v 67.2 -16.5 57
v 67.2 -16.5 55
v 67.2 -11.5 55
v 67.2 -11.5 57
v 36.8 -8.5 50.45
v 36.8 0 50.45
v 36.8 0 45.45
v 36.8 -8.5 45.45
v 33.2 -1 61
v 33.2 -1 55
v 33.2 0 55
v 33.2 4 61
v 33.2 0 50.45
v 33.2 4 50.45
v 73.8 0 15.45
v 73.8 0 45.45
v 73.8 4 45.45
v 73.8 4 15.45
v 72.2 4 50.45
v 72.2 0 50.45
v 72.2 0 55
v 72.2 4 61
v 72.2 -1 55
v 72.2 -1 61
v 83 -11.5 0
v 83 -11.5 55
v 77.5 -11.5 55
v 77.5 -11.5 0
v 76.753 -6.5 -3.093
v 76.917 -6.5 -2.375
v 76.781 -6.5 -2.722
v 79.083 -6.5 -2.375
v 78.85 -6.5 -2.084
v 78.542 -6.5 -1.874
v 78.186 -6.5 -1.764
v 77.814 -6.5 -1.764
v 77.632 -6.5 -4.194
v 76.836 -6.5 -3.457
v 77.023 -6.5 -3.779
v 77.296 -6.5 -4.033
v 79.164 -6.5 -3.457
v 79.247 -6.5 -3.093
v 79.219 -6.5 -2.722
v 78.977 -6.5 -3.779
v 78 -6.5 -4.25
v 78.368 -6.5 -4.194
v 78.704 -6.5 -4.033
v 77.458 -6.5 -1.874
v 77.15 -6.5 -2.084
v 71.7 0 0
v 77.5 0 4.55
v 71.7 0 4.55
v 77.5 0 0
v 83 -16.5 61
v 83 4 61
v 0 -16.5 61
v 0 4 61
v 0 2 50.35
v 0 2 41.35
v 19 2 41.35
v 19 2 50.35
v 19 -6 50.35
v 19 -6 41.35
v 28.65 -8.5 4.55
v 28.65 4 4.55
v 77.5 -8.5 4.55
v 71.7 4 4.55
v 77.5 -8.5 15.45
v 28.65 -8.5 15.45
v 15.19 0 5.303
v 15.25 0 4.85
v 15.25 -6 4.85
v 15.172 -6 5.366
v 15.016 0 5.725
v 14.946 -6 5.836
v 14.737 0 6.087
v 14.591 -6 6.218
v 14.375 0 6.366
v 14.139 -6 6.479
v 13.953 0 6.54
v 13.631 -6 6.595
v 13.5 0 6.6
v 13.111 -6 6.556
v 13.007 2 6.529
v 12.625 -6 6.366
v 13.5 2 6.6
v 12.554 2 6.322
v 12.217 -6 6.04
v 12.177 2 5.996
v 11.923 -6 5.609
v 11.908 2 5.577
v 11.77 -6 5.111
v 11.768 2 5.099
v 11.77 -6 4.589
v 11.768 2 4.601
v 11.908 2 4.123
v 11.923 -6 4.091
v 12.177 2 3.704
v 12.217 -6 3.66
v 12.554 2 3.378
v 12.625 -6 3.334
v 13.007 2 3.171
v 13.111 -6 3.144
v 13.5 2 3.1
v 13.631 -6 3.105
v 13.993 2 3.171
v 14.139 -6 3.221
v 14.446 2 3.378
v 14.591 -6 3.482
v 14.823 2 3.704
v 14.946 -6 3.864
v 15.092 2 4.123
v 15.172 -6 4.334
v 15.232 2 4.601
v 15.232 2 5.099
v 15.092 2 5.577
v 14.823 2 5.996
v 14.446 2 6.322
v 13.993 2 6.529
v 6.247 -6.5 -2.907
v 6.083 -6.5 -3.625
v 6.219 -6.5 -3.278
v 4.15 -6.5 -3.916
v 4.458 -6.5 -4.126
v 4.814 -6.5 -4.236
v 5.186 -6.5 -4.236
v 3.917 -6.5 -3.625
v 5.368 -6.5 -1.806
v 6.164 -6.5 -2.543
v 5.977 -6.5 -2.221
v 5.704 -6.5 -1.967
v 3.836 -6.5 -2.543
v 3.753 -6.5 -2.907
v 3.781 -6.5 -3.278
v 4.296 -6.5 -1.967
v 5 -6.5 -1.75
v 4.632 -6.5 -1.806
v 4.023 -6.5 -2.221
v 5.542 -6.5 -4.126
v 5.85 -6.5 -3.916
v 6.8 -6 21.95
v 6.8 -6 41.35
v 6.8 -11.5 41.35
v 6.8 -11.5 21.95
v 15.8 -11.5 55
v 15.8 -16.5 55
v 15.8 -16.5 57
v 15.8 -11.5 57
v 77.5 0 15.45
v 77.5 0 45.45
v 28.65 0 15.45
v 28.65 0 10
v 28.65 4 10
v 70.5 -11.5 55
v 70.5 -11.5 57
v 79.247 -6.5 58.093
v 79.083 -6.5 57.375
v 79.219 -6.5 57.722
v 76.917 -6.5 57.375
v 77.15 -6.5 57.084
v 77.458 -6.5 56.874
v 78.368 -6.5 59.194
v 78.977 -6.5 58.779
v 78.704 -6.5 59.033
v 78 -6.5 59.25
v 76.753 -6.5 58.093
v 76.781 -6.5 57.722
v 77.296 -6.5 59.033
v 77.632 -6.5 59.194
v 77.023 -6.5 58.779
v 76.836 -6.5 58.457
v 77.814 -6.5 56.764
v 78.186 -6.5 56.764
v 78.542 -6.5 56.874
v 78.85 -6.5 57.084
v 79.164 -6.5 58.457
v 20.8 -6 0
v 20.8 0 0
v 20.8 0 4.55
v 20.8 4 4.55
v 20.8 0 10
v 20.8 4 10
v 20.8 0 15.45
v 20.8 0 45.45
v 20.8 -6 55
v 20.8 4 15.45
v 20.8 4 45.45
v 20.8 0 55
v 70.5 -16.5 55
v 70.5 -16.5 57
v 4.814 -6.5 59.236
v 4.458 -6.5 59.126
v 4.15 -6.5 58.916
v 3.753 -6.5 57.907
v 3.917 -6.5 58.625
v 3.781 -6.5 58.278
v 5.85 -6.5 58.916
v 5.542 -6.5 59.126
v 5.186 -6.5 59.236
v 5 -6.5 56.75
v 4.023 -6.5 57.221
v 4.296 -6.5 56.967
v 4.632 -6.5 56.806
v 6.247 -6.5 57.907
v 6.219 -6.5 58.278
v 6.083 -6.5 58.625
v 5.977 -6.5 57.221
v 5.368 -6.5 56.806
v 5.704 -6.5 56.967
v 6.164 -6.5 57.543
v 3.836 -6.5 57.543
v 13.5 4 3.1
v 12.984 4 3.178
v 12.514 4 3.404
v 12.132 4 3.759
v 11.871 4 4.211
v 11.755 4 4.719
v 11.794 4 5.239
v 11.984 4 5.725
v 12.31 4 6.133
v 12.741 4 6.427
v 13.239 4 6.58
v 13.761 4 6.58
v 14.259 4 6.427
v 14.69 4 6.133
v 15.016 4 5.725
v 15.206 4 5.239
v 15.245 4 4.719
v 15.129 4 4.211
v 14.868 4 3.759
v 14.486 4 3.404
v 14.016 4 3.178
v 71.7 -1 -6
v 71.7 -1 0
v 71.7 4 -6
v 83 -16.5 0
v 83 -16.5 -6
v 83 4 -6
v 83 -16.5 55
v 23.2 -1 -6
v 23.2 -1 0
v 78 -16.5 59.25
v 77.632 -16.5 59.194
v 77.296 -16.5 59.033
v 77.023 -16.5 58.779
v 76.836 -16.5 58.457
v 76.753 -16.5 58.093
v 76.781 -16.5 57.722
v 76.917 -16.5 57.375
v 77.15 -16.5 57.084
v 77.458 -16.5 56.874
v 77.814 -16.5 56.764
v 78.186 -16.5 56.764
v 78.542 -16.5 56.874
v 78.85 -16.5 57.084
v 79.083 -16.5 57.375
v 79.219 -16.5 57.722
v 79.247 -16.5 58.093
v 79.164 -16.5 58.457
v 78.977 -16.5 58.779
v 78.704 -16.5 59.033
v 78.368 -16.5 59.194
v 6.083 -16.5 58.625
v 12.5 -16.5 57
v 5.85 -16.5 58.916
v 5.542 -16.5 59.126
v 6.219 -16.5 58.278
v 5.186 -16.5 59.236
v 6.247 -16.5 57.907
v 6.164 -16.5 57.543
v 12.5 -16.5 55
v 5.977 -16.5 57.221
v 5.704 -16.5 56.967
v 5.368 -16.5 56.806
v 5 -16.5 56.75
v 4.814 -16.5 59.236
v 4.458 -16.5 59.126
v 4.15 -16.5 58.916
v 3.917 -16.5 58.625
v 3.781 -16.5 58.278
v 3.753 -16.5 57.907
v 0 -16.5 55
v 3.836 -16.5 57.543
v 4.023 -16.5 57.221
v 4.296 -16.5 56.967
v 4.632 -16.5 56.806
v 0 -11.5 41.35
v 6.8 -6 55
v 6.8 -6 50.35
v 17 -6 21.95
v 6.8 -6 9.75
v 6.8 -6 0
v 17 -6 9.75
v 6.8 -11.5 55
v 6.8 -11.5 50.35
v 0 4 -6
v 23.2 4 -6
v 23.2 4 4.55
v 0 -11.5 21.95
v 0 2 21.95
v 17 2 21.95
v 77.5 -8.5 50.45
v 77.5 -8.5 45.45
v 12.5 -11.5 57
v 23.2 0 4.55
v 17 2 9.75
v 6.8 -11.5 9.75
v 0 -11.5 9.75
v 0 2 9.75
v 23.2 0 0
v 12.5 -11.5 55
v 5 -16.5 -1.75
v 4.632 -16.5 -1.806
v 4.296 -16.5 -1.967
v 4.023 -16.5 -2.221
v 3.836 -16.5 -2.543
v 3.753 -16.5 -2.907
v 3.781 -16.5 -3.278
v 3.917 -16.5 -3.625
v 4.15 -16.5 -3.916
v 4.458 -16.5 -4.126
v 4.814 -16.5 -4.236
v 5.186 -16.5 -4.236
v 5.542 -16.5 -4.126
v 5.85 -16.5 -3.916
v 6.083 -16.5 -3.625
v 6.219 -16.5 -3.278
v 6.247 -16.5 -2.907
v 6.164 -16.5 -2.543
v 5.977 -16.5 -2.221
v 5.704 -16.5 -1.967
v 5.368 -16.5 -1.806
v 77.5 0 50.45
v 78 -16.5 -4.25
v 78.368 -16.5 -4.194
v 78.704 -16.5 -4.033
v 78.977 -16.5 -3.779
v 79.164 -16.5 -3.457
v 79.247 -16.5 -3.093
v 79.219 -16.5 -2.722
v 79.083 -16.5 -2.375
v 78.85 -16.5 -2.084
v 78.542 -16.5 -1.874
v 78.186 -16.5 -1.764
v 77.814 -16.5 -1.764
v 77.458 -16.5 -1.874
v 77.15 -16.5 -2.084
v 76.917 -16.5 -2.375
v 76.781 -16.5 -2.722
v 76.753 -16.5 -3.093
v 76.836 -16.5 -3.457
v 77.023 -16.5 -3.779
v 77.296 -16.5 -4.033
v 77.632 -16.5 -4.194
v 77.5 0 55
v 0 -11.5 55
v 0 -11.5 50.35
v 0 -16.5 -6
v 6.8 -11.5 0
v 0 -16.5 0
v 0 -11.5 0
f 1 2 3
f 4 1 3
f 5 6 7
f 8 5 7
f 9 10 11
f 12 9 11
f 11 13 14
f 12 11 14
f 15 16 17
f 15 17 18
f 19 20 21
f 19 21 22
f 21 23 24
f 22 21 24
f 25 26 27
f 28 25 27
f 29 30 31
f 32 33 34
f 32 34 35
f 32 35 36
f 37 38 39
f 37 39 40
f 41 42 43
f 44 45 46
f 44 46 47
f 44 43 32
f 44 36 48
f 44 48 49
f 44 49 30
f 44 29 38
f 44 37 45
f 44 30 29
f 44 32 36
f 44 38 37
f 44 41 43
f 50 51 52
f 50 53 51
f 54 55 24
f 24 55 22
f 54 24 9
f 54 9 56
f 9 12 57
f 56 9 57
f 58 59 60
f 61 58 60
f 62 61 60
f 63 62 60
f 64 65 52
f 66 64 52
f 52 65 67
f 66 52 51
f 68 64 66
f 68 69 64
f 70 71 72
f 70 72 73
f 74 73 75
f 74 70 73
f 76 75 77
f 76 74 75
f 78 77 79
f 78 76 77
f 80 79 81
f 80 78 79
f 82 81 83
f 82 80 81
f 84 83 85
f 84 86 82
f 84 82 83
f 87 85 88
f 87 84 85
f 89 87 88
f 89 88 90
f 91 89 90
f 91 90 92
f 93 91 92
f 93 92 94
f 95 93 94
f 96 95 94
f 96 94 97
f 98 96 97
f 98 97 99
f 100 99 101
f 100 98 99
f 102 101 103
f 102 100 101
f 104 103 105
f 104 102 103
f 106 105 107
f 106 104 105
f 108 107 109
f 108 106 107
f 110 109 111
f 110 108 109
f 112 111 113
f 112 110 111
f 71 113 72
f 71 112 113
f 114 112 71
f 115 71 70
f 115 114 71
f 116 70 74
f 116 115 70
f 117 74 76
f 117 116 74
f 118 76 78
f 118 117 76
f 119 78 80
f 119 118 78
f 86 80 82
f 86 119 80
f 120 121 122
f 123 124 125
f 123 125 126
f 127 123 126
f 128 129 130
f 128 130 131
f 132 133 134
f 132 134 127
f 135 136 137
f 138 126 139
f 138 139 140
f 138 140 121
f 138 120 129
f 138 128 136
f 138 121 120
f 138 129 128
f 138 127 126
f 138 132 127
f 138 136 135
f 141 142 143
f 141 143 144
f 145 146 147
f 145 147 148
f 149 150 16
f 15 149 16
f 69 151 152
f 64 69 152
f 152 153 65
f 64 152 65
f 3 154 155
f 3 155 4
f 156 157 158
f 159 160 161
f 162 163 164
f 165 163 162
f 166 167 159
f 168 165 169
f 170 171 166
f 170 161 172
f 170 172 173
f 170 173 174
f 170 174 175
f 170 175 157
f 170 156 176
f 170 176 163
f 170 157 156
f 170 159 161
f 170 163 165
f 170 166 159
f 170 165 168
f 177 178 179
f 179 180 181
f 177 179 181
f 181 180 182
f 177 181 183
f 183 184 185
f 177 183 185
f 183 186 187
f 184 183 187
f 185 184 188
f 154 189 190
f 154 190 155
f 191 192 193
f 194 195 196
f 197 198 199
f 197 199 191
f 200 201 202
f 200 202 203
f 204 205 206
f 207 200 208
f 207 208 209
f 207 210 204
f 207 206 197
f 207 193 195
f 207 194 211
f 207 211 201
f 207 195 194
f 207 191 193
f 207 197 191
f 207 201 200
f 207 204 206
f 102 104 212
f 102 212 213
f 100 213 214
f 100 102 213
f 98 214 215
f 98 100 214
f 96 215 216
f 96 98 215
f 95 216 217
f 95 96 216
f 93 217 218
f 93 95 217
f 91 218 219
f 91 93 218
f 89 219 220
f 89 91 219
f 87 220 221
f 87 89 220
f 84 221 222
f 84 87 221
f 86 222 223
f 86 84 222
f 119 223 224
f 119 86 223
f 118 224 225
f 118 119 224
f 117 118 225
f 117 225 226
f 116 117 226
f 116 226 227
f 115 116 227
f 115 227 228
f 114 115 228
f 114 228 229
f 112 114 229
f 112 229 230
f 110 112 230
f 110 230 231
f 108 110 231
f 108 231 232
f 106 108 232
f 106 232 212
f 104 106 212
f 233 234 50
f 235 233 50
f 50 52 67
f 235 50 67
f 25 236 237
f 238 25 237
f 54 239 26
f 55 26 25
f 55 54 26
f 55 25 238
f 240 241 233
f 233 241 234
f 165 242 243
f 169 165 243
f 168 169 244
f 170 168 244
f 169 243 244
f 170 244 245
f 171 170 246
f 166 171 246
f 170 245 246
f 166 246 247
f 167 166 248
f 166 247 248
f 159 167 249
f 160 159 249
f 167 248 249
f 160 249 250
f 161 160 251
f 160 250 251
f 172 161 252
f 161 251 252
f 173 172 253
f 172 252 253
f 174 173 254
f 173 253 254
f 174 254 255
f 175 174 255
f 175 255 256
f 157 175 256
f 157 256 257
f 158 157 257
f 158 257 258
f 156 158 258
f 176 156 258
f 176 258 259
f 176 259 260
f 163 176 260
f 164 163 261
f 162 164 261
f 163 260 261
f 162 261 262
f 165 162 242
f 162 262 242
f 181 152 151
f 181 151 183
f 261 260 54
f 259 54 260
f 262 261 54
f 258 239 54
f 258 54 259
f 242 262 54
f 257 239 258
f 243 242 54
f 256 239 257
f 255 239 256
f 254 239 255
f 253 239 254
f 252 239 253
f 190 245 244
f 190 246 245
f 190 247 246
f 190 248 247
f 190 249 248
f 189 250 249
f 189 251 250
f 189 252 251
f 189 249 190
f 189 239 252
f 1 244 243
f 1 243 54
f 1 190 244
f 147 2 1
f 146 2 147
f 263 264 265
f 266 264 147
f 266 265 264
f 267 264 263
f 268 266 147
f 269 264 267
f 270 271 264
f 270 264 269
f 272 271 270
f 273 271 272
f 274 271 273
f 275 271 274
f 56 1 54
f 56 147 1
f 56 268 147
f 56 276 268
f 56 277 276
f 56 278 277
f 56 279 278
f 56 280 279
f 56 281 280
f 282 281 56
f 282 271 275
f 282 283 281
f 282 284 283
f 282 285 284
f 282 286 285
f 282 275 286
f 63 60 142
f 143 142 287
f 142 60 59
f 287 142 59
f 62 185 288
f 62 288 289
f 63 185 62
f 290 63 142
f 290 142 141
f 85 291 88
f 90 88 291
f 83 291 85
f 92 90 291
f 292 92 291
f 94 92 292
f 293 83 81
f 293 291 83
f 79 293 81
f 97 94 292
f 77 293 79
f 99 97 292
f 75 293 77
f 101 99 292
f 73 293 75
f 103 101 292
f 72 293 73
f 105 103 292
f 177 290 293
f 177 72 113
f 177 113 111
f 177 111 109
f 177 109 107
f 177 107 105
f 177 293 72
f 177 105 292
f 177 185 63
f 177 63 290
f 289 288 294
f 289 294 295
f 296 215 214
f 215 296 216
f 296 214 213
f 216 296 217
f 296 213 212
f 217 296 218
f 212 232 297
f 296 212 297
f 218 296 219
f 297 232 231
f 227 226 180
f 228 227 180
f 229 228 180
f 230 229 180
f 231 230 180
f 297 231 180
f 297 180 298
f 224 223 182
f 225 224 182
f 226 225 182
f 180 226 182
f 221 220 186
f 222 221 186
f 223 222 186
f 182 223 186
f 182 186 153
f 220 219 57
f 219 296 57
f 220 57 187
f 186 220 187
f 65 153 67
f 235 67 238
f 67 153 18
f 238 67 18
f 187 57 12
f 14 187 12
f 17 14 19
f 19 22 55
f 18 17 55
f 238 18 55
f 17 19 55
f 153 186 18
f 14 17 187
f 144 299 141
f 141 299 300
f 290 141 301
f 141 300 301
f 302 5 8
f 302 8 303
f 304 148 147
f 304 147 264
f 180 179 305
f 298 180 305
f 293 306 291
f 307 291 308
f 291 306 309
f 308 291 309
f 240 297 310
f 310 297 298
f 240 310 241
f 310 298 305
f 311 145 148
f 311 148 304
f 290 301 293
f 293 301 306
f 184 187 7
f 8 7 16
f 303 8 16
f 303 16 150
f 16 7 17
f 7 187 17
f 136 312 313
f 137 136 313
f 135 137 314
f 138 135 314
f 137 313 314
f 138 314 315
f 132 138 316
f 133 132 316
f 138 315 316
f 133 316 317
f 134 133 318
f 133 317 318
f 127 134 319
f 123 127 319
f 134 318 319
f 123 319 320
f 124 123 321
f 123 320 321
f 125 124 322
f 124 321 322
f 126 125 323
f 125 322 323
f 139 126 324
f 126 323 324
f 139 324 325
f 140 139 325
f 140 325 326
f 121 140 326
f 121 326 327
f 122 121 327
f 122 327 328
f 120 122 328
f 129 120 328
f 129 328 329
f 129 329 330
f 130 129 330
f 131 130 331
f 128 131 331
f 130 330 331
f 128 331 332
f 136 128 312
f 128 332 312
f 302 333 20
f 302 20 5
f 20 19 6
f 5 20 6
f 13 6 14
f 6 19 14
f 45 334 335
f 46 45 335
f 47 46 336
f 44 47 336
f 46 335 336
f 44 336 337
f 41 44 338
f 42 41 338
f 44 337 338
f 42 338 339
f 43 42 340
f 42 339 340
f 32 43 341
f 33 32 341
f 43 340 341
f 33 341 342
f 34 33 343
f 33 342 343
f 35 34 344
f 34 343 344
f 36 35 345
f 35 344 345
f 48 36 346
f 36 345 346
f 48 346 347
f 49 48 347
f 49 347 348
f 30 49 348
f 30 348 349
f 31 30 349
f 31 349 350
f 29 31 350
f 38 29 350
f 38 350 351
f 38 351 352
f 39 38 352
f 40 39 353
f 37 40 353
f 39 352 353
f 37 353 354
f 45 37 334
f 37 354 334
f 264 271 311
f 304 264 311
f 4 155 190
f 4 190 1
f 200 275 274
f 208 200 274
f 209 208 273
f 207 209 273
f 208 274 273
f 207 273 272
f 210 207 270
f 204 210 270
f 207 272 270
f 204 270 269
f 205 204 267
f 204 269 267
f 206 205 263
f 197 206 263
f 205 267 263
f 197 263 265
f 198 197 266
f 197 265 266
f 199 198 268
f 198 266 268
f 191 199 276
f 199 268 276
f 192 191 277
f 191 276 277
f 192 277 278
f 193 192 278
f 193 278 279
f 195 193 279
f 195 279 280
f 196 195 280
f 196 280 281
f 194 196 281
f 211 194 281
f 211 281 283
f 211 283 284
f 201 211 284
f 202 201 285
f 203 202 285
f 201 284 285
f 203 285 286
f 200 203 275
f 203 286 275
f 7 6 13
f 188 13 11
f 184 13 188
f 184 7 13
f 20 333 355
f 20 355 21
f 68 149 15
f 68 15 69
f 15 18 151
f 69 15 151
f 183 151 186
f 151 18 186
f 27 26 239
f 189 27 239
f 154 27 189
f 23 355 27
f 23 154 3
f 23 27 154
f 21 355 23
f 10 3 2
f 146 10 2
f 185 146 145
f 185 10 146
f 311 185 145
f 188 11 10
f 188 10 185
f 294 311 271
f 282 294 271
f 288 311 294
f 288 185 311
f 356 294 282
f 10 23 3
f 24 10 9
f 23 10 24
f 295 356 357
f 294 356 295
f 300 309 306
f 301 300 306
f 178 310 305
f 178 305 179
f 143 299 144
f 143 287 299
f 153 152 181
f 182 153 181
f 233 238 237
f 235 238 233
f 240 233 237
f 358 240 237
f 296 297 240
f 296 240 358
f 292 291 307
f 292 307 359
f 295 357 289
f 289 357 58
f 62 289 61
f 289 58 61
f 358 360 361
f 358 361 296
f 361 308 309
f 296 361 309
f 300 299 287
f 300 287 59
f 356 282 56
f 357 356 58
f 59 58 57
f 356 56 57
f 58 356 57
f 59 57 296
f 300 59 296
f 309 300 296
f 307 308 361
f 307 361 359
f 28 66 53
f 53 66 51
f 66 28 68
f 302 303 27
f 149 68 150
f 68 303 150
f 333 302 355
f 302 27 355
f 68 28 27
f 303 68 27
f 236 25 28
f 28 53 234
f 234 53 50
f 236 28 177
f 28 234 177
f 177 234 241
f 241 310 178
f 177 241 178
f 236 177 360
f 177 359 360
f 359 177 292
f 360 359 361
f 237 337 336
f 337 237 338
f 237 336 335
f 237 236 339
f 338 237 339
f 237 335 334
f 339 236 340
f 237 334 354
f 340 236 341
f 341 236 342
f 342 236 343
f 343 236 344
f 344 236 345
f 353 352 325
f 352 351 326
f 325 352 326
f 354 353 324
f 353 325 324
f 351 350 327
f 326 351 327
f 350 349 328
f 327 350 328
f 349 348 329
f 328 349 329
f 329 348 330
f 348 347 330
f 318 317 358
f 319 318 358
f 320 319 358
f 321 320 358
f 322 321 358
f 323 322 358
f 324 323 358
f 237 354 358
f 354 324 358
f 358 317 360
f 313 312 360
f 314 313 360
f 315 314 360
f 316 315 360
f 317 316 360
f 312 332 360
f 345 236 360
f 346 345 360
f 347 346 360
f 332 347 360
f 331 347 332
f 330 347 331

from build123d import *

# Parameters (mm, degrees)
SKETCH1_R               = 1.75
SKETCH1_W               = 53
SKETCH1_H               = 30
BOSS_EXTRUDE1_DEPTH     = 2
BOSS_EXTRUDE2_OUTLINE_R = 1.75
BOSS_EXTRUDE2_DEPTH     = 11.5
SKETCH3_R               = 1.75
SKETCH3_W               = 53
SKETCH3_H               = 30
BOSS_EXTRUDE3_DEPTH     = 2
BOSS_EXTRUDE4_DEPTH     = 6
BOSS_EXTRUDE5_DEPTH     = 6
SKETCH7_W               = 3.3
SKETCH7_H               = 5
CUT_EXTRUDE3_DEPTH      = 2
SKETCH9_W               = 55
SKETCH9_H               = 5.5
CUT_EXTRUDE5_DEPTH      = 14
SKETCH10_W              = 5.5
SKETCH10_H              = 11.5
BOSS_EXTRUDE6_DEPTH     = 55
BOSS_EXTRUDE8_DEPTH     = 8.5
SKETCH14_R              = 1.25
CUT_EXTRUDE6_DEPTH      = 10


# Read off the part's stored shape, not the designer's step: Boss-Extrude2
with BuildPart() as part:
    # Sketch1 → Boss-Extrude1 (new body)
    with BuildSketch(Plane(origin=(0, 0, 0), x_dir=(1, 0, 0), z_dir=(0, 1, 0))):
        Polygon((0, 0), (23.2, 0), (23.2, -4.55), (20.8, -4.55), (20.8, -10), (28.65, -10), (28.65, -4.55), (71.7, -4.55), (71.7, 0), (83, 0), (83, -22.35), (83, -30.15), (83, -55), (72.2, -55), (72.2, -50.45), (33.2, -50.45), (33.2, -55), (0, -55), (0, -50.35), (19, -50.35), (19, -41.35), (0, -41.35), (0, -21.95), (17, -21.95), (17, -9.75), (0, -9.75), align=None)
        with Locations(Location((13.5, -4.85, 0), (0, 0, 270))):
            Circle(SKETCH1_R, mode=Mode.SUBTRACT)
        with Locations((47.3, -30.45)):
            Rectangle(SKETCH1_W, SKETCH1_H, mode=Mode.SUBTRACT)
    extrude(amount=BOSS_EXTRUDE1_DEPTH)

    # Boss-Extrude2 outline → Boss-Extrude2 (add)
    with BuildSketch(Plane.XZ):
        Polygon((0, 9.75), (0, 0), (20.8, 0), (20.8, 55), (0, 55), (0, 50.35), (19, 50.35), (19, 41.35), (0, 41.35), (0, 21.95), (17, 21.95), (17, 9.75), align=None)
        with Locations((13.5, 4.85)):
            Circle(BOSS_EXTRUDE2_OUTLINE_R, mode=Mode.SUBTRACT)
    extrude(amount=BOSS_EXTRUDE2_DEPTH)

    # Sketch3 → Boss-Extrude3 (add)
    with BuildSketch(Plane(origin=(0, 2, 0), x_dir=(1, 0, 0), z_dir=(0, 1, 0))):
        Polygon((23.2, 0), (0, 0), (0, -55), (33.2, -55), (33.2, -50.45), (72.2, -50.45), (72.2, -55), (83, -55), (83, 0), (71.7, 0), (71.7, -4.55), (28.65, -4.55), (28.65, -10), (20.8, -10), (20.8, -4.55), (23.2, -4.55), align=None)
        with Locations(Location((13.5, -4.85, 0), (0, 0, 90))):
            Circle(SKETCH3_R, mode=Mode.SUBTRACT)
        with Locations((47.3, -30.45)):
            Rectangle(SKETCH3_W, SKETCH3_H, mode=Mode.SUBTRACT)
    extrude(amount=BOSS_EXTRUDE3_DEPTH)

    # Sketch4 → Boss-Extrude4 (add)
    with BuildSketch(Plane.XY.offset(55)):
        Polygon((0, 4), (33.2, 4), (33.2, 0), (33.2, -1), (72.2, -1), (72.2, 0), (72.2, 4), (83, 4), (83, -11.5), (83, -16.5), (0, -16.5), (0, -11.5), align=None)
    extrude(amount=BOSS_EXTRUDE4_DEPTH)

    # Sketch5 → Boss-Extrude5 (add)
    with BuildSketch(Plane(origin=(0, 0, 0), x_dir=(-1, 0, 0), z_dir=(0, 0, -1))):
        Polygon((-23.2, 4), (-23.2, 0), (-23.2, -1), (-71.7, -1), (-71.7, 0), (-71.7, 4), (-83, 4), (-83, -11.5), (-83, -16.5), (0, -16.5), (0, -11.5), (0, 4), align=None)
    extrude(amount=BOSS_EXTRUDE5_DEPTH)

    # Sketch7 → Cut-Extrude3 (cut)
    with BuildSketch(Plane(origin=(0, 0, 55), x_dir=(-1, 0, 0), z_dir=(0, 0, -1))):
        with Locations((-14.15, -14)):
            Rectangle(SKETCH7_W, SKETCH7_H)
        with Locations((-68.85, -14)):
            Rectangle(SKETCH7_W, SKETCH7_H)
    extrude(amount=-CUT_EXTRUDE3_DEPTH, mode=Mode.SUBTRACT)

    # Sketch9 → Cut-Extrude5 (cut)
    with BuildSketch(Plane(origin=(20.8, 0, 0), x_dir=(0, 0, -1), z_dir=(1, 0, 0))):
        with Locations((-27.5, -8.75)):
            Rectangle(SKETCH9_W, SKETCH9_H)
    extrude(amount=-CUT_EXTRUDE5_DEPTH, mode=Mode.SUBTRACT)

    # Sketch10 → Boss-Extrude6 (add)
    with BuildSketch(Plane(origin=(0, 0, 55), x_dir=(-1, 0, 0), z_dir=(0, 0, -1))):
        with Locations((-80.25, -5.75)):
            Rectangle(SKETCH10_W, SKETCH10_H)
    extrude(amount=BOSS_EXTRUDE6_DEPTH)

    # Sketch12 → Boss-Extrude8 (add)
    with BuildSketch(Plane.XZ):
        Polygon((73.8, 45.45), (77.5, 45.45), (77.5, 50.45), (72.2, 50.45), (36.8, 50.45), (36.8, 45.45), align=None)
        Polygon((28.65, 10), (28.65, 4.55), (71.7, 4.55), (77.5, 4.55), (77.5, 15.45), (73.8, 15.45), (28.65, 15.45), align=None)
    extrude(amount=BOSS_EXTRUDE8_DEPTH)

    # Sketch14 → Cut-Extrude6 (cut)
    with BuildSketch(Plane.XZ.offset(16.5)):
        with Locations(Location((5, 58, 0), (0, 0, 270))):
            Circle(SKETCH14_R)
        with Locations(Location((78, 58, 0), (0, 0, 90))):
            Circle(SKETCH14_R)
        with Locations(Location((78, -3, 0), (0, 0, 270))):
            Circle(SKETCH14_R)
        with Locations(Location((5, -3, 0), (0, 0, 90))):
            Circle(SKETCH14_R)
    extrude(amount=-CUT_EXTRUDE6_DEPTH, mode=Mode.SUBTRACT)


solid = part.part
